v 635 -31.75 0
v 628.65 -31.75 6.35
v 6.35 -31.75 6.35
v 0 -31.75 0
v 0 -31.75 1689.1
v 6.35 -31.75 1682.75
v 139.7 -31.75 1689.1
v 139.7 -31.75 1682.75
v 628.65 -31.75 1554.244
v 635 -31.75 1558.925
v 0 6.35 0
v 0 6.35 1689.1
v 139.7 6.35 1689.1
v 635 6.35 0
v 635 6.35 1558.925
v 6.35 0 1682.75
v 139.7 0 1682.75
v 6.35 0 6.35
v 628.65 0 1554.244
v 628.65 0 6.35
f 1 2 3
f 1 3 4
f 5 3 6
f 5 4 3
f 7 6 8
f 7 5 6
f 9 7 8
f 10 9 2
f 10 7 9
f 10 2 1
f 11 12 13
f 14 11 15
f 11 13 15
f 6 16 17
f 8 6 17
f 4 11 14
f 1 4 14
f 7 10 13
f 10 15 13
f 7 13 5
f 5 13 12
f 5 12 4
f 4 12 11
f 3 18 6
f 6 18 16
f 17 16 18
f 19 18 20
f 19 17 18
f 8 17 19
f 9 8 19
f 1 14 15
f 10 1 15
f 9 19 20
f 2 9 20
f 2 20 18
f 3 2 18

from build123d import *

# Parameters (mm, degrees)
F1_DEPTH = 6.35
F3_DEPTH = 31.75


# Not quite as in the source:
# - a length typed as a fraction of an inch, garbled in the dataset ("3 / 203.2 mm" for 3/8 in), is restored


with BuildPart() as f1:
    # F0 (on Front) → F1 (new body)
    with BuildSketch(Plane.XZ):
        Polygon((0, 1689.1), (0, 0), (635, 0), (635, 1558.925), (139.7, 1689.1), align=None)
    extrude(amount=-F1_DEPTH)

    # F2 (on Front) → F3 (join)
    with BuildSketch(Plane.XZ):
        Polygon((635, 0), (635, 1558.925), (139.7, 1689.1), (0, 1689.1), (0, 0), align=None)
        Polygon((6.35, 6.35), (6.35, 1682.75), (139.7, 1682.75), (628.65, 1554.2439102564), (628.65, 6.35), align=None, mode=Mode.SUBTRACT)
    extrude(amount=F3_DEPTH)


solid = f1.part
